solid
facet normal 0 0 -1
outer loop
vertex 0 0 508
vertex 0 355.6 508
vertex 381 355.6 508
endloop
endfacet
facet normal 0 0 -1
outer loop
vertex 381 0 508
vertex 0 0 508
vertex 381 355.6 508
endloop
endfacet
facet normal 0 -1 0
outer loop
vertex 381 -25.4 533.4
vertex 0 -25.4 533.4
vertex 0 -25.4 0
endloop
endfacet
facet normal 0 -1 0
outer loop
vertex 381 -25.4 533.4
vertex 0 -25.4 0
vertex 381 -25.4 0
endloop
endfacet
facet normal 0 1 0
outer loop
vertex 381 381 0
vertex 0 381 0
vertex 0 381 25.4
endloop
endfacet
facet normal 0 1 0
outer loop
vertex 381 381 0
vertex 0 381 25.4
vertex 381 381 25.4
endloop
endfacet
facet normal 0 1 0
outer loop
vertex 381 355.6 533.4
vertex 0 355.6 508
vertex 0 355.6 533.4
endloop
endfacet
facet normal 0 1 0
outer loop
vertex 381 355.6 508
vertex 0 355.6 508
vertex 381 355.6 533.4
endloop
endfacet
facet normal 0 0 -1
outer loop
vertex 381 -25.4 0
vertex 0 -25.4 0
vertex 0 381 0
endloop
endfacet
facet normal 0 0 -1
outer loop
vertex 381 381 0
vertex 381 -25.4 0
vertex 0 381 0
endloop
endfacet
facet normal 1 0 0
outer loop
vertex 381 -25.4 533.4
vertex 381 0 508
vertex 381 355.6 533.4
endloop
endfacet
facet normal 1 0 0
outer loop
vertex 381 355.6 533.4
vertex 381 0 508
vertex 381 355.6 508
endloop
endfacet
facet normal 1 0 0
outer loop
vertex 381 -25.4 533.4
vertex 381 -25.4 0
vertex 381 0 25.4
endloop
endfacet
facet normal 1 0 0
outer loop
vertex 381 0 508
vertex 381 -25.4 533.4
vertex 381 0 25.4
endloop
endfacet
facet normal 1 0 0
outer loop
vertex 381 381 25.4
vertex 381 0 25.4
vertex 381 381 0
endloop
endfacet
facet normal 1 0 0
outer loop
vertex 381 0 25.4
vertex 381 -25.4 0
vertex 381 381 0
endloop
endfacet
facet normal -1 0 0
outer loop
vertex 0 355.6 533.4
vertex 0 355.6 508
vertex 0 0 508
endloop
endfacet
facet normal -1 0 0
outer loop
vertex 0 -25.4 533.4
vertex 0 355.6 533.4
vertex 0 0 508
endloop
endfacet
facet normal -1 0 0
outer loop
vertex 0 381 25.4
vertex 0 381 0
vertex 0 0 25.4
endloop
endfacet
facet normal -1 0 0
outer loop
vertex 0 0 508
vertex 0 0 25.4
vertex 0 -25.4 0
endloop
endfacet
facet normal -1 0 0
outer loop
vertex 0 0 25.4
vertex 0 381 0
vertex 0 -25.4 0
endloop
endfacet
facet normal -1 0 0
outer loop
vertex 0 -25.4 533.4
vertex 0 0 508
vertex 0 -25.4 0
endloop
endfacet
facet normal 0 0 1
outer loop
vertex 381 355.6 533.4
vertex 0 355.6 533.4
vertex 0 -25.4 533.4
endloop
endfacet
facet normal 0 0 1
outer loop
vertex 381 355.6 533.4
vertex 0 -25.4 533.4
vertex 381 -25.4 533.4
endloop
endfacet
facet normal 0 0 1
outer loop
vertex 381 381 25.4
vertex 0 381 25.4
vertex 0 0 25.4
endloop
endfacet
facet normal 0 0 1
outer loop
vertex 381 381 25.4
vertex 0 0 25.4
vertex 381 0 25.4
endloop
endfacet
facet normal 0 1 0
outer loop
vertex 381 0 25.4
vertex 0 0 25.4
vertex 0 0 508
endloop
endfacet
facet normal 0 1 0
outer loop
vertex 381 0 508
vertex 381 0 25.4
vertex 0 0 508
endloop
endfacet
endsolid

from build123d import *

# Parameters (mm, degrees)
F0_W     = 381
F0_H     = 381
F1_DEPTH = 25.4
F2_W     = 25.4
F2_H     = 508
F3_DEPTH = 381
F4_W     = 381
F4_H     = 355.6
F4_H_2   = 25.4
F5_DEPTH = 25.4


with BuildPart() as f1:
    # F0 (on Top) → F1 (new body)
    with BuildSketch(Plane.XY):
        with Locations((190.5, 190.5)):
            Rectangle(F0_W, F0_H)
    extrude(amount=F1_DEPTH)

    # F2 (on Right) → F3 (join)
    with BuildSketch(Plane.YZ):
        with Locations((-12.7, 254)):
            Rectangle(F2_W, F2_H)
    extrude(amount=F3_DEPTH)

    # F4 (on face) → F5 (join)
    with BuildSketch(Plane.XY.offset(508)):
        with Locations((190.5, 177.8)):
            Rectangle(F4_W, F4_H)
        with Locations((190.5, -12.7)):
            Rectangle(F4_W, F4_H_2)
    extrude(amount=F5_DEPTH)


solid = f1.part
